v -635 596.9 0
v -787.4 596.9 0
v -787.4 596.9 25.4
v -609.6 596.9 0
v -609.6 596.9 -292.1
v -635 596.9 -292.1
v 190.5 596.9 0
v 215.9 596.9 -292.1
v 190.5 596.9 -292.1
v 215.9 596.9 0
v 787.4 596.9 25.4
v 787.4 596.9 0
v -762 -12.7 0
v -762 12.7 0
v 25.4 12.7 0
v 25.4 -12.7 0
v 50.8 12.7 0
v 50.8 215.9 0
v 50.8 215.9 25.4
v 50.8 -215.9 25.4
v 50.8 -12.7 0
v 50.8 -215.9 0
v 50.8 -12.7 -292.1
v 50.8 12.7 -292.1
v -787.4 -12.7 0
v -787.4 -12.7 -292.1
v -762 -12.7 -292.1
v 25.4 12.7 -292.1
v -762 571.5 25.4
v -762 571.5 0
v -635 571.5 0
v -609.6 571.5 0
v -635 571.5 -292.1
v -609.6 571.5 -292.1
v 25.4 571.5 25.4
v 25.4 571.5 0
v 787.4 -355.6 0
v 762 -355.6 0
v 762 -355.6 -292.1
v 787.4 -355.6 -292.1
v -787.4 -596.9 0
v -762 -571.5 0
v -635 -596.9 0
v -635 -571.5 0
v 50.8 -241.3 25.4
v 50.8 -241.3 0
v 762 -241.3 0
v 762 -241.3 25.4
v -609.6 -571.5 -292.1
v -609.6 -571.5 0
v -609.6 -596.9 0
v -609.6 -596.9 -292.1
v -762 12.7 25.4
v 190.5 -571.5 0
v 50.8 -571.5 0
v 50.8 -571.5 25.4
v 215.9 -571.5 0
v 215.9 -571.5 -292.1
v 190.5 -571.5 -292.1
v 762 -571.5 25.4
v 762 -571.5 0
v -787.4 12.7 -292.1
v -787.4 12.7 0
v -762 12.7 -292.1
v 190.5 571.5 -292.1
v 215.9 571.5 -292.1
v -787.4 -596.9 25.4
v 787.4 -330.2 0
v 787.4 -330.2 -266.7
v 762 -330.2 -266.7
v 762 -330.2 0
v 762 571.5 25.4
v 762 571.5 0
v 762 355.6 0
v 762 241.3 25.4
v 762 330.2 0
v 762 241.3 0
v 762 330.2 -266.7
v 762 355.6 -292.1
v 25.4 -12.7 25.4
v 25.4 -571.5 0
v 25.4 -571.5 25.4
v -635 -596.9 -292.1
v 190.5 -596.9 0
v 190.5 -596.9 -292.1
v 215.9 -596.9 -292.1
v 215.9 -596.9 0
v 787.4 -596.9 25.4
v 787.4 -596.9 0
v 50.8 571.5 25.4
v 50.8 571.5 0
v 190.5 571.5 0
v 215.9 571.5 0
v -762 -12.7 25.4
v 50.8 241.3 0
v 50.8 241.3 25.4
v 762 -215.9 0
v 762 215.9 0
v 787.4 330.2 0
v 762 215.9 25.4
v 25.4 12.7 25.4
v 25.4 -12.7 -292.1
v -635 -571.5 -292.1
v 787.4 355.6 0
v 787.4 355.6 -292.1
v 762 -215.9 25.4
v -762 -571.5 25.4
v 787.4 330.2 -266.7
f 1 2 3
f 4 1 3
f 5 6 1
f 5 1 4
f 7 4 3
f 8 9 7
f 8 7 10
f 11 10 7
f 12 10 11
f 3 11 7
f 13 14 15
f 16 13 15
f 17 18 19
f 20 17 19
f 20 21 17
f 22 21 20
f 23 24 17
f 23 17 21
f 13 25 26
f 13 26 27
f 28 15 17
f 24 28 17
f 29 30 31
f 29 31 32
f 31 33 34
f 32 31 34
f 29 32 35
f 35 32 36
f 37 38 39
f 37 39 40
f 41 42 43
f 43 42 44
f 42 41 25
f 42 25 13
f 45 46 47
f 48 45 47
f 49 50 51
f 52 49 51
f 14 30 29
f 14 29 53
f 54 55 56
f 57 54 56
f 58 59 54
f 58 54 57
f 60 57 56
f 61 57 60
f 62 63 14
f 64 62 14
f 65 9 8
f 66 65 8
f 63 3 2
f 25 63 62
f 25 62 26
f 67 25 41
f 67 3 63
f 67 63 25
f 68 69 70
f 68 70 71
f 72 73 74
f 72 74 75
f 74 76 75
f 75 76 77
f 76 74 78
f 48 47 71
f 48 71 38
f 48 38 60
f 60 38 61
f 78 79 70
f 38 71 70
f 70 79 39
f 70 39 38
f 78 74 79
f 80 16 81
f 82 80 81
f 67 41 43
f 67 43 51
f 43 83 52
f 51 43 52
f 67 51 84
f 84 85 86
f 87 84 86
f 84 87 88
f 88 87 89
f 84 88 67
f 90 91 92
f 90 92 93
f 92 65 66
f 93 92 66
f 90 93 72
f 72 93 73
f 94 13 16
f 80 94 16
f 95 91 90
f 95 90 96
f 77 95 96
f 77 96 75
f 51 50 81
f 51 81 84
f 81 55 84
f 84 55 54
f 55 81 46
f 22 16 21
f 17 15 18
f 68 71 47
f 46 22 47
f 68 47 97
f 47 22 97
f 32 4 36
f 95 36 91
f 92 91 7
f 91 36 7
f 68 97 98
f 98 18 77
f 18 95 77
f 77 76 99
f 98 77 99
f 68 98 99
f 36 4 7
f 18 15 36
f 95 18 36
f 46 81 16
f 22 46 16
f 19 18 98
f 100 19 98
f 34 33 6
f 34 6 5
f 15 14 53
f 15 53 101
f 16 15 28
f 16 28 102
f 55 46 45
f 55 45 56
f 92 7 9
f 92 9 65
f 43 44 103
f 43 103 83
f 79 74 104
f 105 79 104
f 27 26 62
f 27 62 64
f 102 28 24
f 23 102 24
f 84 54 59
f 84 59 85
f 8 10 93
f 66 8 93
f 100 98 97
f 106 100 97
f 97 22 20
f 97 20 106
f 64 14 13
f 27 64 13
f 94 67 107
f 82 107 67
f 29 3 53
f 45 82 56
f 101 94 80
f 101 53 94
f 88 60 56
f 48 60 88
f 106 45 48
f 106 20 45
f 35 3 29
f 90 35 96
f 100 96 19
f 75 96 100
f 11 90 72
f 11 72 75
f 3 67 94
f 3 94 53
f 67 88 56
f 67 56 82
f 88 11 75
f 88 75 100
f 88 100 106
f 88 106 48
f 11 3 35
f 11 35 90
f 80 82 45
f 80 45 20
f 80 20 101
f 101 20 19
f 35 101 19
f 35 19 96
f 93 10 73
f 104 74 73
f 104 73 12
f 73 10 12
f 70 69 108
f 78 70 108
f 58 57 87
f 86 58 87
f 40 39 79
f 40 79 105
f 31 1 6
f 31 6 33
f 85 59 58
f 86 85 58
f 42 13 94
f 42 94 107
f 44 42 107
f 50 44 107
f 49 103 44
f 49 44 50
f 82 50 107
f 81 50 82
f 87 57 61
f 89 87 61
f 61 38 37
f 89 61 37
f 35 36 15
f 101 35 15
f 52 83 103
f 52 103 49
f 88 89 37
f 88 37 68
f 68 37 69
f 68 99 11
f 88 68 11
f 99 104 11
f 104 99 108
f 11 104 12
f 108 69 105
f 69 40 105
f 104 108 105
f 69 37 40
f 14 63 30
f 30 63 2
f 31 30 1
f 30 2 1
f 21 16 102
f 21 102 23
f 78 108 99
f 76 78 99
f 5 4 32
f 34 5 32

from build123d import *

# Parameters (mm, degrees)
F0_W     = 1574.8
F0_H     = 1193.8
F1_DEPTH = 25.4
F2_W     = 787.4
F2_H     = 558.8
F2_W_2   = 711.2
F2_H_2   = 330.2
F2_H_3   = 431.8
F3_DEPTH = 25.401
F4_W     = 25.4
F4_H     = 25.4
F4_H_2   = 711.2
F5_DEPTH = 292.1
F6_W     = 660.4
F6_H     = 266.7
F7_DEPTH = 50.8


with BuildPart() as f1:
    # F0 (on Top) → F1 (new body)
    with BuildSketch(Plane.XY):
        Rectangle(F0_W, F0_H)
    extrude(amount=F1_DEPTH)

    # F2 (on face) → F3 (cut, through all)
    with BuildSketch(Plane(origin=(0, 0, 0), x_dir=(1, 0, 0), z_dir=(0, 0, -1))):
        with Locations((-368.3, -292.1)):
            Rectangle(F2_W, F2_H)
        with Locations((-368.3, 292.1)):
            Rectangle(F2_W, F2_H)
        with Locations((406.4, -406.4)):
            Rectangle(F2_W_2, F2_H_2)
        with Locations((406.4, 0)):
            Rectangle(F2_W_2, F2_H_3)
        with Locations((406.4, 406.4)):
            Rectangle(F2_W_2, F2_H_2)
    extrude(amount=-F3_DEPTH, mode=Mode.SUBTRACT)

    # F4 (on face) → F5 (join)
    with BuildSketch(Plane(origin=(0, 0, 0), x_dir=(1, 0, 0), z_dir=(0, 0, -1))):
        with Locations((-622.3, 584.2)):
            Rectangle(F4_W, F4_H)
        with Locations((-622.3, -584.2)):
            Rectangle(F4_W, F4_H)
        with Locations((-774.7, 0)):
            Rectangle(F4_W, F4_H)
        with Locations((38.1, 0)):
            Rectangle(F4_W, F4_H)
        with Locations((774.7, 0)):
            Rectangle(F4_W, F4_H_2)
        with Locations((203.2, 584.2)):
            Rectangle(F4_W, F4_H)
        with Locations((203.2, -584.2)):
            Rectangle(F4_W, F4_H)
    extrude(amount=F5_DEPTH)

    # F6 (on face) → F7 (cut)
    with BuildSketch(Plane.YZ.offset(787.4)):
        with Locations((0, -133.35)):
            Rectangle(F6_W, F6_H)
    extrude(amount=-F7_DEPTH, mode=Mode.SUBTRACT)


solid = f1.part
